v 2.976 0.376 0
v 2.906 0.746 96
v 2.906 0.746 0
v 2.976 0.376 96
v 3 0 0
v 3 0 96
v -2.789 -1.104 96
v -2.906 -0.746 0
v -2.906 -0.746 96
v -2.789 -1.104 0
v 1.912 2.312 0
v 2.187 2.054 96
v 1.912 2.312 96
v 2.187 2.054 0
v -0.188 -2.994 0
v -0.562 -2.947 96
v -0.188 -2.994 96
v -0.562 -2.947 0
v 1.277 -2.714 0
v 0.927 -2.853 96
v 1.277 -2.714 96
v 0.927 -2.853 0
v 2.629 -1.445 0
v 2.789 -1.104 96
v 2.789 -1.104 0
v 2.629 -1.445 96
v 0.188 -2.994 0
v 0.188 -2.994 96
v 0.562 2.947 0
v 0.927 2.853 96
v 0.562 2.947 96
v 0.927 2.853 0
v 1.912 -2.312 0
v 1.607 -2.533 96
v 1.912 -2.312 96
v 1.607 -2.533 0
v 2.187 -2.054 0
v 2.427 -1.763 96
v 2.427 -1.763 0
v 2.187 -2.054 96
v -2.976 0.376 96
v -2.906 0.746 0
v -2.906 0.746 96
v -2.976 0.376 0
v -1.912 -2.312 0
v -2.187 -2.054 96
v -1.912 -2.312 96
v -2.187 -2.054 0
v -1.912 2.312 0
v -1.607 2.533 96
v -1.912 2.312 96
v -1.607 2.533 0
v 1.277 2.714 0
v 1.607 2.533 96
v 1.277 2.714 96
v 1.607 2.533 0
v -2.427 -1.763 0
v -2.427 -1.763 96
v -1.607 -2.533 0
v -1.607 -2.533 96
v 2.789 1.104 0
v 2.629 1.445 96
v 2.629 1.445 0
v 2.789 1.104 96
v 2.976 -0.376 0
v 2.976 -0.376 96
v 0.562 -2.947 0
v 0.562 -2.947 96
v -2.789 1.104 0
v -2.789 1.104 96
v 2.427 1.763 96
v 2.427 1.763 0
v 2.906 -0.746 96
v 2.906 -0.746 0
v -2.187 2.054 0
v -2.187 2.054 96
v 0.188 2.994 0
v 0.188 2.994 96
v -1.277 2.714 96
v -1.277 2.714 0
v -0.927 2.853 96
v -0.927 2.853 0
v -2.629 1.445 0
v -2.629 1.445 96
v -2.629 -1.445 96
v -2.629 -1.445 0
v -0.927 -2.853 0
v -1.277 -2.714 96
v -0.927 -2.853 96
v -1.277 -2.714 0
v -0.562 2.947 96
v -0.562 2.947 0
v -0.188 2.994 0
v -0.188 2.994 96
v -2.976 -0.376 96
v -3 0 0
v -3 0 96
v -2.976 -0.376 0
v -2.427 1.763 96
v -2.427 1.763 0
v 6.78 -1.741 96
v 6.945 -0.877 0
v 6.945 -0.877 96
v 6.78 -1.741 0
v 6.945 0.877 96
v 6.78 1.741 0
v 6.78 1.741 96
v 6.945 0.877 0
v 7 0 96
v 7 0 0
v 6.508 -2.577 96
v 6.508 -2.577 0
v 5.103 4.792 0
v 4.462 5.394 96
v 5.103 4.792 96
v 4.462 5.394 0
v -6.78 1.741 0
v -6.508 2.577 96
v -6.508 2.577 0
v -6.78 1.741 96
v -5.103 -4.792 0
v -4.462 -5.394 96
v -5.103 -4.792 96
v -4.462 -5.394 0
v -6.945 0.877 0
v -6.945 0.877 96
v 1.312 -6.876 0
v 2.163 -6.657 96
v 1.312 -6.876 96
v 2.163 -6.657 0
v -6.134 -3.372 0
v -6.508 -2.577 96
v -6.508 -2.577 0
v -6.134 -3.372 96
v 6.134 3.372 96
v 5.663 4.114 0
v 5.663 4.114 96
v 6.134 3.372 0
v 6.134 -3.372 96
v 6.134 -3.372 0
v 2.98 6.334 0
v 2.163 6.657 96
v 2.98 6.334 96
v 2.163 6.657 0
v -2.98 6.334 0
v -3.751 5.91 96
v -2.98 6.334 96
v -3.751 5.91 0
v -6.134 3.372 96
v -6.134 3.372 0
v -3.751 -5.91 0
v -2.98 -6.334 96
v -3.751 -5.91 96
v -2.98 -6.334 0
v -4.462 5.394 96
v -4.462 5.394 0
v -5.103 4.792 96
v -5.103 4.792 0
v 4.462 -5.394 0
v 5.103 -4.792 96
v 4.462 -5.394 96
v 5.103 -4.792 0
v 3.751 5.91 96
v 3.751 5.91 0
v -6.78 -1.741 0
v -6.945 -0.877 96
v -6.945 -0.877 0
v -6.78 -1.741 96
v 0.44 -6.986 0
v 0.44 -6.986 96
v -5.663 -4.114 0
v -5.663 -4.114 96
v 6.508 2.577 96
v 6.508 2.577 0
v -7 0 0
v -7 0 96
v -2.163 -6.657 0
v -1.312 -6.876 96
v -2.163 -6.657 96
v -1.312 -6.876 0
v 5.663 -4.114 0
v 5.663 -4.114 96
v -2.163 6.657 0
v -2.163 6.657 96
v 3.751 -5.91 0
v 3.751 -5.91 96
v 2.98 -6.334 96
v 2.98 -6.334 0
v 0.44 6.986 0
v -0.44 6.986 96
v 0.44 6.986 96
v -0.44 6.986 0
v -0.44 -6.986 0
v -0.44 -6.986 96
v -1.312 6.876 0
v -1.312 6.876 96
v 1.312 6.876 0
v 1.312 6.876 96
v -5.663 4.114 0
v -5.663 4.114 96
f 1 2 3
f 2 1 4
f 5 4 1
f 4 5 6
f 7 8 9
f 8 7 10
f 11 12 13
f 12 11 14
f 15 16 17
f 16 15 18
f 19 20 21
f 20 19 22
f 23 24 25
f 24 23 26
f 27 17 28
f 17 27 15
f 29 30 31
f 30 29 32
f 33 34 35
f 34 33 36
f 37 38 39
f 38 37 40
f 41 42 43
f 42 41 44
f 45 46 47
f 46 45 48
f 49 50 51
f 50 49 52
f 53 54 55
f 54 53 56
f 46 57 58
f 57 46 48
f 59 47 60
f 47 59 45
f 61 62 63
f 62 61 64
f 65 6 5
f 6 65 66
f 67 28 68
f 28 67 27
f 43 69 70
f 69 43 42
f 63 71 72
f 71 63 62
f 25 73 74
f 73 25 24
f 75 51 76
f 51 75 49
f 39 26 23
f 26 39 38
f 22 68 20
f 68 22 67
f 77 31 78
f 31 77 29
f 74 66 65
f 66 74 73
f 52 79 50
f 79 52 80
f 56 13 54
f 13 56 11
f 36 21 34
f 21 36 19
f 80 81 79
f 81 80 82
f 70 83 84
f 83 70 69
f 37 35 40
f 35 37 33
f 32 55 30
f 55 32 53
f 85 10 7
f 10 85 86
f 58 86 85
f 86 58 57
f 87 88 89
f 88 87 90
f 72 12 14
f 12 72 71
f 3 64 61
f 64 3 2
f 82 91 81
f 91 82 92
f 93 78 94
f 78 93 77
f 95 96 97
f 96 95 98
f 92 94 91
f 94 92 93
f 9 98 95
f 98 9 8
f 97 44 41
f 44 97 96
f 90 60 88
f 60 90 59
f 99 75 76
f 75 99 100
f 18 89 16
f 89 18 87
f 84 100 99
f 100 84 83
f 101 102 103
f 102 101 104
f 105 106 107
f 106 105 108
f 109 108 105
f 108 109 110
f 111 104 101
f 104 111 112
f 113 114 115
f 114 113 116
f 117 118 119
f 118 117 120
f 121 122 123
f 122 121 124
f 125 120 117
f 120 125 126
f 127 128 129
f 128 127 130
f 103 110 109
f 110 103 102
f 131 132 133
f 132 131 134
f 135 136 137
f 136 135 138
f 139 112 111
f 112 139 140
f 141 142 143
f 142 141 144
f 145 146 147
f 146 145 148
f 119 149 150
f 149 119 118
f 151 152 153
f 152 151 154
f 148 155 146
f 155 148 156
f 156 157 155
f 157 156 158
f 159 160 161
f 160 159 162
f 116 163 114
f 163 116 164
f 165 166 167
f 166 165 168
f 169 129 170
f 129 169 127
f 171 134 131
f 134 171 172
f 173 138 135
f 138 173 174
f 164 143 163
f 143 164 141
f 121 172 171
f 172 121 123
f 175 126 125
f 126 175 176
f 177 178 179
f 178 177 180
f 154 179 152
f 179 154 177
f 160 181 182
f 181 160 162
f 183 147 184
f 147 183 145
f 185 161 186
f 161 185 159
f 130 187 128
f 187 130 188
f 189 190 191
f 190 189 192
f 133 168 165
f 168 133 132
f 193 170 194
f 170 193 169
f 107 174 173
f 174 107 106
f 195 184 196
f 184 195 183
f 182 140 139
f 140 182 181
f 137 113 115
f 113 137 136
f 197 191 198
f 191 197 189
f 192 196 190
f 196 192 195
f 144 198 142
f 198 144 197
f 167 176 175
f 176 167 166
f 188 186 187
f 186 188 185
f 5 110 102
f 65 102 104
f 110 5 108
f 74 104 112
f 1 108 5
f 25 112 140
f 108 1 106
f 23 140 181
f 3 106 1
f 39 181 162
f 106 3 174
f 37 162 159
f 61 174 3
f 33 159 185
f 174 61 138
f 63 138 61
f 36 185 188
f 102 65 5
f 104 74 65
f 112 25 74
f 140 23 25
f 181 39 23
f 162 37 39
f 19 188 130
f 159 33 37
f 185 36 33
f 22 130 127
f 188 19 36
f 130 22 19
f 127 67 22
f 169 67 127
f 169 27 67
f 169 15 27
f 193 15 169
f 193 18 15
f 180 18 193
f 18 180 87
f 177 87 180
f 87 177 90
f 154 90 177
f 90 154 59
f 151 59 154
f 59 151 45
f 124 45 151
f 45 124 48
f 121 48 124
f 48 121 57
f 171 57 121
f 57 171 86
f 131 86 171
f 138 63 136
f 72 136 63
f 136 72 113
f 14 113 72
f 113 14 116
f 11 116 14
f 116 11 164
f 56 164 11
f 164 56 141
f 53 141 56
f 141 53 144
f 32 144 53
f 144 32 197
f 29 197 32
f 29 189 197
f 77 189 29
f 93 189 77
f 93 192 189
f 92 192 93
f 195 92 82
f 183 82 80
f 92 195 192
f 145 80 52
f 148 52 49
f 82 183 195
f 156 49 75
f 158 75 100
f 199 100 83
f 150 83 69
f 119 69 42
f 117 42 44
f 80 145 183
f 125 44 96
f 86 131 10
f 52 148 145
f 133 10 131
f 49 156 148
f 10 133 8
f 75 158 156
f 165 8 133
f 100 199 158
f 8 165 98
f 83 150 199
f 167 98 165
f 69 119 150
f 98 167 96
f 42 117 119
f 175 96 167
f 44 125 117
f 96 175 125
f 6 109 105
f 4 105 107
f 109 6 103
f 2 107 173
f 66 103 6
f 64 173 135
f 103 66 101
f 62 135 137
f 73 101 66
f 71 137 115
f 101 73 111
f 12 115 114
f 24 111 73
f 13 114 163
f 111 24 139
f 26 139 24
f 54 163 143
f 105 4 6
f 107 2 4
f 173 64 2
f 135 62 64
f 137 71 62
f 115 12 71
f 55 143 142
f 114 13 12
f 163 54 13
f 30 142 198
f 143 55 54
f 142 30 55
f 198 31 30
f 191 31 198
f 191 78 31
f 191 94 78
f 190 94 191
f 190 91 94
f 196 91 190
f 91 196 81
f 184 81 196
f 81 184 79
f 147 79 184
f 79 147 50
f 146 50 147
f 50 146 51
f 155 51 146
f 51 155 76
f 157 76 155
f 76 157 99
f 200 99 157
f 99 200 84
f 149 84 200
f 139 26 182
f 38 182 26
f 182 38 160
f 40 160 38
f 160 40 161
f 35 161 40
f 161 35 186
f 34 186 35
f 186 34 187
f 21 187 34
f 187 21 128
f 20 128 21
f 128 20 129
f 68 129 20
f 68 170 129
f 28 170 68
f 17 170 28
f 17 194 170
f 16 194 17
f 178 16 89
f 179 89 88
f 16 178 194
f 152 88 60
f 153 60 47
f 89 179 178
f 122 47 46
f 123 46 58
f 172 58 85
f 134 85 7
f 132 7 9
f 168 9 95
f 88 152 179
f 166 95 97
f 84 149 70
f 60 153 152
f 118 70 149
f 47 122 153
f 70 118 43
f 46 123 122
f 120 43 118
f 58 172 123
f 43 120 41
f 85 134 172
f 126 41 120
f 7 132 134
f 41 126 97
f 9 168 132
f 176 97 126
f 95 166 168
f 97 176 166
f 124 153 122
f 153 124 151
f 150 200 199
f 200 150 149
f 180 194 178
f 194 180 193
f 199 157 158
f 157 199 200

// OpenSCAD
$fn = 50;


difference() {
	union() {
		cylinder(h = 96, r = 7.0000000000);
	}
	union() {
		translate(v = [0, 0, -100]) {
			cylinder(h = 200, r = 3.0000000000);
		}
		translate(v = [0, 0, -100]) {
			cylinder(h = 200, r = 1.5000000000);
		}
	}
}
